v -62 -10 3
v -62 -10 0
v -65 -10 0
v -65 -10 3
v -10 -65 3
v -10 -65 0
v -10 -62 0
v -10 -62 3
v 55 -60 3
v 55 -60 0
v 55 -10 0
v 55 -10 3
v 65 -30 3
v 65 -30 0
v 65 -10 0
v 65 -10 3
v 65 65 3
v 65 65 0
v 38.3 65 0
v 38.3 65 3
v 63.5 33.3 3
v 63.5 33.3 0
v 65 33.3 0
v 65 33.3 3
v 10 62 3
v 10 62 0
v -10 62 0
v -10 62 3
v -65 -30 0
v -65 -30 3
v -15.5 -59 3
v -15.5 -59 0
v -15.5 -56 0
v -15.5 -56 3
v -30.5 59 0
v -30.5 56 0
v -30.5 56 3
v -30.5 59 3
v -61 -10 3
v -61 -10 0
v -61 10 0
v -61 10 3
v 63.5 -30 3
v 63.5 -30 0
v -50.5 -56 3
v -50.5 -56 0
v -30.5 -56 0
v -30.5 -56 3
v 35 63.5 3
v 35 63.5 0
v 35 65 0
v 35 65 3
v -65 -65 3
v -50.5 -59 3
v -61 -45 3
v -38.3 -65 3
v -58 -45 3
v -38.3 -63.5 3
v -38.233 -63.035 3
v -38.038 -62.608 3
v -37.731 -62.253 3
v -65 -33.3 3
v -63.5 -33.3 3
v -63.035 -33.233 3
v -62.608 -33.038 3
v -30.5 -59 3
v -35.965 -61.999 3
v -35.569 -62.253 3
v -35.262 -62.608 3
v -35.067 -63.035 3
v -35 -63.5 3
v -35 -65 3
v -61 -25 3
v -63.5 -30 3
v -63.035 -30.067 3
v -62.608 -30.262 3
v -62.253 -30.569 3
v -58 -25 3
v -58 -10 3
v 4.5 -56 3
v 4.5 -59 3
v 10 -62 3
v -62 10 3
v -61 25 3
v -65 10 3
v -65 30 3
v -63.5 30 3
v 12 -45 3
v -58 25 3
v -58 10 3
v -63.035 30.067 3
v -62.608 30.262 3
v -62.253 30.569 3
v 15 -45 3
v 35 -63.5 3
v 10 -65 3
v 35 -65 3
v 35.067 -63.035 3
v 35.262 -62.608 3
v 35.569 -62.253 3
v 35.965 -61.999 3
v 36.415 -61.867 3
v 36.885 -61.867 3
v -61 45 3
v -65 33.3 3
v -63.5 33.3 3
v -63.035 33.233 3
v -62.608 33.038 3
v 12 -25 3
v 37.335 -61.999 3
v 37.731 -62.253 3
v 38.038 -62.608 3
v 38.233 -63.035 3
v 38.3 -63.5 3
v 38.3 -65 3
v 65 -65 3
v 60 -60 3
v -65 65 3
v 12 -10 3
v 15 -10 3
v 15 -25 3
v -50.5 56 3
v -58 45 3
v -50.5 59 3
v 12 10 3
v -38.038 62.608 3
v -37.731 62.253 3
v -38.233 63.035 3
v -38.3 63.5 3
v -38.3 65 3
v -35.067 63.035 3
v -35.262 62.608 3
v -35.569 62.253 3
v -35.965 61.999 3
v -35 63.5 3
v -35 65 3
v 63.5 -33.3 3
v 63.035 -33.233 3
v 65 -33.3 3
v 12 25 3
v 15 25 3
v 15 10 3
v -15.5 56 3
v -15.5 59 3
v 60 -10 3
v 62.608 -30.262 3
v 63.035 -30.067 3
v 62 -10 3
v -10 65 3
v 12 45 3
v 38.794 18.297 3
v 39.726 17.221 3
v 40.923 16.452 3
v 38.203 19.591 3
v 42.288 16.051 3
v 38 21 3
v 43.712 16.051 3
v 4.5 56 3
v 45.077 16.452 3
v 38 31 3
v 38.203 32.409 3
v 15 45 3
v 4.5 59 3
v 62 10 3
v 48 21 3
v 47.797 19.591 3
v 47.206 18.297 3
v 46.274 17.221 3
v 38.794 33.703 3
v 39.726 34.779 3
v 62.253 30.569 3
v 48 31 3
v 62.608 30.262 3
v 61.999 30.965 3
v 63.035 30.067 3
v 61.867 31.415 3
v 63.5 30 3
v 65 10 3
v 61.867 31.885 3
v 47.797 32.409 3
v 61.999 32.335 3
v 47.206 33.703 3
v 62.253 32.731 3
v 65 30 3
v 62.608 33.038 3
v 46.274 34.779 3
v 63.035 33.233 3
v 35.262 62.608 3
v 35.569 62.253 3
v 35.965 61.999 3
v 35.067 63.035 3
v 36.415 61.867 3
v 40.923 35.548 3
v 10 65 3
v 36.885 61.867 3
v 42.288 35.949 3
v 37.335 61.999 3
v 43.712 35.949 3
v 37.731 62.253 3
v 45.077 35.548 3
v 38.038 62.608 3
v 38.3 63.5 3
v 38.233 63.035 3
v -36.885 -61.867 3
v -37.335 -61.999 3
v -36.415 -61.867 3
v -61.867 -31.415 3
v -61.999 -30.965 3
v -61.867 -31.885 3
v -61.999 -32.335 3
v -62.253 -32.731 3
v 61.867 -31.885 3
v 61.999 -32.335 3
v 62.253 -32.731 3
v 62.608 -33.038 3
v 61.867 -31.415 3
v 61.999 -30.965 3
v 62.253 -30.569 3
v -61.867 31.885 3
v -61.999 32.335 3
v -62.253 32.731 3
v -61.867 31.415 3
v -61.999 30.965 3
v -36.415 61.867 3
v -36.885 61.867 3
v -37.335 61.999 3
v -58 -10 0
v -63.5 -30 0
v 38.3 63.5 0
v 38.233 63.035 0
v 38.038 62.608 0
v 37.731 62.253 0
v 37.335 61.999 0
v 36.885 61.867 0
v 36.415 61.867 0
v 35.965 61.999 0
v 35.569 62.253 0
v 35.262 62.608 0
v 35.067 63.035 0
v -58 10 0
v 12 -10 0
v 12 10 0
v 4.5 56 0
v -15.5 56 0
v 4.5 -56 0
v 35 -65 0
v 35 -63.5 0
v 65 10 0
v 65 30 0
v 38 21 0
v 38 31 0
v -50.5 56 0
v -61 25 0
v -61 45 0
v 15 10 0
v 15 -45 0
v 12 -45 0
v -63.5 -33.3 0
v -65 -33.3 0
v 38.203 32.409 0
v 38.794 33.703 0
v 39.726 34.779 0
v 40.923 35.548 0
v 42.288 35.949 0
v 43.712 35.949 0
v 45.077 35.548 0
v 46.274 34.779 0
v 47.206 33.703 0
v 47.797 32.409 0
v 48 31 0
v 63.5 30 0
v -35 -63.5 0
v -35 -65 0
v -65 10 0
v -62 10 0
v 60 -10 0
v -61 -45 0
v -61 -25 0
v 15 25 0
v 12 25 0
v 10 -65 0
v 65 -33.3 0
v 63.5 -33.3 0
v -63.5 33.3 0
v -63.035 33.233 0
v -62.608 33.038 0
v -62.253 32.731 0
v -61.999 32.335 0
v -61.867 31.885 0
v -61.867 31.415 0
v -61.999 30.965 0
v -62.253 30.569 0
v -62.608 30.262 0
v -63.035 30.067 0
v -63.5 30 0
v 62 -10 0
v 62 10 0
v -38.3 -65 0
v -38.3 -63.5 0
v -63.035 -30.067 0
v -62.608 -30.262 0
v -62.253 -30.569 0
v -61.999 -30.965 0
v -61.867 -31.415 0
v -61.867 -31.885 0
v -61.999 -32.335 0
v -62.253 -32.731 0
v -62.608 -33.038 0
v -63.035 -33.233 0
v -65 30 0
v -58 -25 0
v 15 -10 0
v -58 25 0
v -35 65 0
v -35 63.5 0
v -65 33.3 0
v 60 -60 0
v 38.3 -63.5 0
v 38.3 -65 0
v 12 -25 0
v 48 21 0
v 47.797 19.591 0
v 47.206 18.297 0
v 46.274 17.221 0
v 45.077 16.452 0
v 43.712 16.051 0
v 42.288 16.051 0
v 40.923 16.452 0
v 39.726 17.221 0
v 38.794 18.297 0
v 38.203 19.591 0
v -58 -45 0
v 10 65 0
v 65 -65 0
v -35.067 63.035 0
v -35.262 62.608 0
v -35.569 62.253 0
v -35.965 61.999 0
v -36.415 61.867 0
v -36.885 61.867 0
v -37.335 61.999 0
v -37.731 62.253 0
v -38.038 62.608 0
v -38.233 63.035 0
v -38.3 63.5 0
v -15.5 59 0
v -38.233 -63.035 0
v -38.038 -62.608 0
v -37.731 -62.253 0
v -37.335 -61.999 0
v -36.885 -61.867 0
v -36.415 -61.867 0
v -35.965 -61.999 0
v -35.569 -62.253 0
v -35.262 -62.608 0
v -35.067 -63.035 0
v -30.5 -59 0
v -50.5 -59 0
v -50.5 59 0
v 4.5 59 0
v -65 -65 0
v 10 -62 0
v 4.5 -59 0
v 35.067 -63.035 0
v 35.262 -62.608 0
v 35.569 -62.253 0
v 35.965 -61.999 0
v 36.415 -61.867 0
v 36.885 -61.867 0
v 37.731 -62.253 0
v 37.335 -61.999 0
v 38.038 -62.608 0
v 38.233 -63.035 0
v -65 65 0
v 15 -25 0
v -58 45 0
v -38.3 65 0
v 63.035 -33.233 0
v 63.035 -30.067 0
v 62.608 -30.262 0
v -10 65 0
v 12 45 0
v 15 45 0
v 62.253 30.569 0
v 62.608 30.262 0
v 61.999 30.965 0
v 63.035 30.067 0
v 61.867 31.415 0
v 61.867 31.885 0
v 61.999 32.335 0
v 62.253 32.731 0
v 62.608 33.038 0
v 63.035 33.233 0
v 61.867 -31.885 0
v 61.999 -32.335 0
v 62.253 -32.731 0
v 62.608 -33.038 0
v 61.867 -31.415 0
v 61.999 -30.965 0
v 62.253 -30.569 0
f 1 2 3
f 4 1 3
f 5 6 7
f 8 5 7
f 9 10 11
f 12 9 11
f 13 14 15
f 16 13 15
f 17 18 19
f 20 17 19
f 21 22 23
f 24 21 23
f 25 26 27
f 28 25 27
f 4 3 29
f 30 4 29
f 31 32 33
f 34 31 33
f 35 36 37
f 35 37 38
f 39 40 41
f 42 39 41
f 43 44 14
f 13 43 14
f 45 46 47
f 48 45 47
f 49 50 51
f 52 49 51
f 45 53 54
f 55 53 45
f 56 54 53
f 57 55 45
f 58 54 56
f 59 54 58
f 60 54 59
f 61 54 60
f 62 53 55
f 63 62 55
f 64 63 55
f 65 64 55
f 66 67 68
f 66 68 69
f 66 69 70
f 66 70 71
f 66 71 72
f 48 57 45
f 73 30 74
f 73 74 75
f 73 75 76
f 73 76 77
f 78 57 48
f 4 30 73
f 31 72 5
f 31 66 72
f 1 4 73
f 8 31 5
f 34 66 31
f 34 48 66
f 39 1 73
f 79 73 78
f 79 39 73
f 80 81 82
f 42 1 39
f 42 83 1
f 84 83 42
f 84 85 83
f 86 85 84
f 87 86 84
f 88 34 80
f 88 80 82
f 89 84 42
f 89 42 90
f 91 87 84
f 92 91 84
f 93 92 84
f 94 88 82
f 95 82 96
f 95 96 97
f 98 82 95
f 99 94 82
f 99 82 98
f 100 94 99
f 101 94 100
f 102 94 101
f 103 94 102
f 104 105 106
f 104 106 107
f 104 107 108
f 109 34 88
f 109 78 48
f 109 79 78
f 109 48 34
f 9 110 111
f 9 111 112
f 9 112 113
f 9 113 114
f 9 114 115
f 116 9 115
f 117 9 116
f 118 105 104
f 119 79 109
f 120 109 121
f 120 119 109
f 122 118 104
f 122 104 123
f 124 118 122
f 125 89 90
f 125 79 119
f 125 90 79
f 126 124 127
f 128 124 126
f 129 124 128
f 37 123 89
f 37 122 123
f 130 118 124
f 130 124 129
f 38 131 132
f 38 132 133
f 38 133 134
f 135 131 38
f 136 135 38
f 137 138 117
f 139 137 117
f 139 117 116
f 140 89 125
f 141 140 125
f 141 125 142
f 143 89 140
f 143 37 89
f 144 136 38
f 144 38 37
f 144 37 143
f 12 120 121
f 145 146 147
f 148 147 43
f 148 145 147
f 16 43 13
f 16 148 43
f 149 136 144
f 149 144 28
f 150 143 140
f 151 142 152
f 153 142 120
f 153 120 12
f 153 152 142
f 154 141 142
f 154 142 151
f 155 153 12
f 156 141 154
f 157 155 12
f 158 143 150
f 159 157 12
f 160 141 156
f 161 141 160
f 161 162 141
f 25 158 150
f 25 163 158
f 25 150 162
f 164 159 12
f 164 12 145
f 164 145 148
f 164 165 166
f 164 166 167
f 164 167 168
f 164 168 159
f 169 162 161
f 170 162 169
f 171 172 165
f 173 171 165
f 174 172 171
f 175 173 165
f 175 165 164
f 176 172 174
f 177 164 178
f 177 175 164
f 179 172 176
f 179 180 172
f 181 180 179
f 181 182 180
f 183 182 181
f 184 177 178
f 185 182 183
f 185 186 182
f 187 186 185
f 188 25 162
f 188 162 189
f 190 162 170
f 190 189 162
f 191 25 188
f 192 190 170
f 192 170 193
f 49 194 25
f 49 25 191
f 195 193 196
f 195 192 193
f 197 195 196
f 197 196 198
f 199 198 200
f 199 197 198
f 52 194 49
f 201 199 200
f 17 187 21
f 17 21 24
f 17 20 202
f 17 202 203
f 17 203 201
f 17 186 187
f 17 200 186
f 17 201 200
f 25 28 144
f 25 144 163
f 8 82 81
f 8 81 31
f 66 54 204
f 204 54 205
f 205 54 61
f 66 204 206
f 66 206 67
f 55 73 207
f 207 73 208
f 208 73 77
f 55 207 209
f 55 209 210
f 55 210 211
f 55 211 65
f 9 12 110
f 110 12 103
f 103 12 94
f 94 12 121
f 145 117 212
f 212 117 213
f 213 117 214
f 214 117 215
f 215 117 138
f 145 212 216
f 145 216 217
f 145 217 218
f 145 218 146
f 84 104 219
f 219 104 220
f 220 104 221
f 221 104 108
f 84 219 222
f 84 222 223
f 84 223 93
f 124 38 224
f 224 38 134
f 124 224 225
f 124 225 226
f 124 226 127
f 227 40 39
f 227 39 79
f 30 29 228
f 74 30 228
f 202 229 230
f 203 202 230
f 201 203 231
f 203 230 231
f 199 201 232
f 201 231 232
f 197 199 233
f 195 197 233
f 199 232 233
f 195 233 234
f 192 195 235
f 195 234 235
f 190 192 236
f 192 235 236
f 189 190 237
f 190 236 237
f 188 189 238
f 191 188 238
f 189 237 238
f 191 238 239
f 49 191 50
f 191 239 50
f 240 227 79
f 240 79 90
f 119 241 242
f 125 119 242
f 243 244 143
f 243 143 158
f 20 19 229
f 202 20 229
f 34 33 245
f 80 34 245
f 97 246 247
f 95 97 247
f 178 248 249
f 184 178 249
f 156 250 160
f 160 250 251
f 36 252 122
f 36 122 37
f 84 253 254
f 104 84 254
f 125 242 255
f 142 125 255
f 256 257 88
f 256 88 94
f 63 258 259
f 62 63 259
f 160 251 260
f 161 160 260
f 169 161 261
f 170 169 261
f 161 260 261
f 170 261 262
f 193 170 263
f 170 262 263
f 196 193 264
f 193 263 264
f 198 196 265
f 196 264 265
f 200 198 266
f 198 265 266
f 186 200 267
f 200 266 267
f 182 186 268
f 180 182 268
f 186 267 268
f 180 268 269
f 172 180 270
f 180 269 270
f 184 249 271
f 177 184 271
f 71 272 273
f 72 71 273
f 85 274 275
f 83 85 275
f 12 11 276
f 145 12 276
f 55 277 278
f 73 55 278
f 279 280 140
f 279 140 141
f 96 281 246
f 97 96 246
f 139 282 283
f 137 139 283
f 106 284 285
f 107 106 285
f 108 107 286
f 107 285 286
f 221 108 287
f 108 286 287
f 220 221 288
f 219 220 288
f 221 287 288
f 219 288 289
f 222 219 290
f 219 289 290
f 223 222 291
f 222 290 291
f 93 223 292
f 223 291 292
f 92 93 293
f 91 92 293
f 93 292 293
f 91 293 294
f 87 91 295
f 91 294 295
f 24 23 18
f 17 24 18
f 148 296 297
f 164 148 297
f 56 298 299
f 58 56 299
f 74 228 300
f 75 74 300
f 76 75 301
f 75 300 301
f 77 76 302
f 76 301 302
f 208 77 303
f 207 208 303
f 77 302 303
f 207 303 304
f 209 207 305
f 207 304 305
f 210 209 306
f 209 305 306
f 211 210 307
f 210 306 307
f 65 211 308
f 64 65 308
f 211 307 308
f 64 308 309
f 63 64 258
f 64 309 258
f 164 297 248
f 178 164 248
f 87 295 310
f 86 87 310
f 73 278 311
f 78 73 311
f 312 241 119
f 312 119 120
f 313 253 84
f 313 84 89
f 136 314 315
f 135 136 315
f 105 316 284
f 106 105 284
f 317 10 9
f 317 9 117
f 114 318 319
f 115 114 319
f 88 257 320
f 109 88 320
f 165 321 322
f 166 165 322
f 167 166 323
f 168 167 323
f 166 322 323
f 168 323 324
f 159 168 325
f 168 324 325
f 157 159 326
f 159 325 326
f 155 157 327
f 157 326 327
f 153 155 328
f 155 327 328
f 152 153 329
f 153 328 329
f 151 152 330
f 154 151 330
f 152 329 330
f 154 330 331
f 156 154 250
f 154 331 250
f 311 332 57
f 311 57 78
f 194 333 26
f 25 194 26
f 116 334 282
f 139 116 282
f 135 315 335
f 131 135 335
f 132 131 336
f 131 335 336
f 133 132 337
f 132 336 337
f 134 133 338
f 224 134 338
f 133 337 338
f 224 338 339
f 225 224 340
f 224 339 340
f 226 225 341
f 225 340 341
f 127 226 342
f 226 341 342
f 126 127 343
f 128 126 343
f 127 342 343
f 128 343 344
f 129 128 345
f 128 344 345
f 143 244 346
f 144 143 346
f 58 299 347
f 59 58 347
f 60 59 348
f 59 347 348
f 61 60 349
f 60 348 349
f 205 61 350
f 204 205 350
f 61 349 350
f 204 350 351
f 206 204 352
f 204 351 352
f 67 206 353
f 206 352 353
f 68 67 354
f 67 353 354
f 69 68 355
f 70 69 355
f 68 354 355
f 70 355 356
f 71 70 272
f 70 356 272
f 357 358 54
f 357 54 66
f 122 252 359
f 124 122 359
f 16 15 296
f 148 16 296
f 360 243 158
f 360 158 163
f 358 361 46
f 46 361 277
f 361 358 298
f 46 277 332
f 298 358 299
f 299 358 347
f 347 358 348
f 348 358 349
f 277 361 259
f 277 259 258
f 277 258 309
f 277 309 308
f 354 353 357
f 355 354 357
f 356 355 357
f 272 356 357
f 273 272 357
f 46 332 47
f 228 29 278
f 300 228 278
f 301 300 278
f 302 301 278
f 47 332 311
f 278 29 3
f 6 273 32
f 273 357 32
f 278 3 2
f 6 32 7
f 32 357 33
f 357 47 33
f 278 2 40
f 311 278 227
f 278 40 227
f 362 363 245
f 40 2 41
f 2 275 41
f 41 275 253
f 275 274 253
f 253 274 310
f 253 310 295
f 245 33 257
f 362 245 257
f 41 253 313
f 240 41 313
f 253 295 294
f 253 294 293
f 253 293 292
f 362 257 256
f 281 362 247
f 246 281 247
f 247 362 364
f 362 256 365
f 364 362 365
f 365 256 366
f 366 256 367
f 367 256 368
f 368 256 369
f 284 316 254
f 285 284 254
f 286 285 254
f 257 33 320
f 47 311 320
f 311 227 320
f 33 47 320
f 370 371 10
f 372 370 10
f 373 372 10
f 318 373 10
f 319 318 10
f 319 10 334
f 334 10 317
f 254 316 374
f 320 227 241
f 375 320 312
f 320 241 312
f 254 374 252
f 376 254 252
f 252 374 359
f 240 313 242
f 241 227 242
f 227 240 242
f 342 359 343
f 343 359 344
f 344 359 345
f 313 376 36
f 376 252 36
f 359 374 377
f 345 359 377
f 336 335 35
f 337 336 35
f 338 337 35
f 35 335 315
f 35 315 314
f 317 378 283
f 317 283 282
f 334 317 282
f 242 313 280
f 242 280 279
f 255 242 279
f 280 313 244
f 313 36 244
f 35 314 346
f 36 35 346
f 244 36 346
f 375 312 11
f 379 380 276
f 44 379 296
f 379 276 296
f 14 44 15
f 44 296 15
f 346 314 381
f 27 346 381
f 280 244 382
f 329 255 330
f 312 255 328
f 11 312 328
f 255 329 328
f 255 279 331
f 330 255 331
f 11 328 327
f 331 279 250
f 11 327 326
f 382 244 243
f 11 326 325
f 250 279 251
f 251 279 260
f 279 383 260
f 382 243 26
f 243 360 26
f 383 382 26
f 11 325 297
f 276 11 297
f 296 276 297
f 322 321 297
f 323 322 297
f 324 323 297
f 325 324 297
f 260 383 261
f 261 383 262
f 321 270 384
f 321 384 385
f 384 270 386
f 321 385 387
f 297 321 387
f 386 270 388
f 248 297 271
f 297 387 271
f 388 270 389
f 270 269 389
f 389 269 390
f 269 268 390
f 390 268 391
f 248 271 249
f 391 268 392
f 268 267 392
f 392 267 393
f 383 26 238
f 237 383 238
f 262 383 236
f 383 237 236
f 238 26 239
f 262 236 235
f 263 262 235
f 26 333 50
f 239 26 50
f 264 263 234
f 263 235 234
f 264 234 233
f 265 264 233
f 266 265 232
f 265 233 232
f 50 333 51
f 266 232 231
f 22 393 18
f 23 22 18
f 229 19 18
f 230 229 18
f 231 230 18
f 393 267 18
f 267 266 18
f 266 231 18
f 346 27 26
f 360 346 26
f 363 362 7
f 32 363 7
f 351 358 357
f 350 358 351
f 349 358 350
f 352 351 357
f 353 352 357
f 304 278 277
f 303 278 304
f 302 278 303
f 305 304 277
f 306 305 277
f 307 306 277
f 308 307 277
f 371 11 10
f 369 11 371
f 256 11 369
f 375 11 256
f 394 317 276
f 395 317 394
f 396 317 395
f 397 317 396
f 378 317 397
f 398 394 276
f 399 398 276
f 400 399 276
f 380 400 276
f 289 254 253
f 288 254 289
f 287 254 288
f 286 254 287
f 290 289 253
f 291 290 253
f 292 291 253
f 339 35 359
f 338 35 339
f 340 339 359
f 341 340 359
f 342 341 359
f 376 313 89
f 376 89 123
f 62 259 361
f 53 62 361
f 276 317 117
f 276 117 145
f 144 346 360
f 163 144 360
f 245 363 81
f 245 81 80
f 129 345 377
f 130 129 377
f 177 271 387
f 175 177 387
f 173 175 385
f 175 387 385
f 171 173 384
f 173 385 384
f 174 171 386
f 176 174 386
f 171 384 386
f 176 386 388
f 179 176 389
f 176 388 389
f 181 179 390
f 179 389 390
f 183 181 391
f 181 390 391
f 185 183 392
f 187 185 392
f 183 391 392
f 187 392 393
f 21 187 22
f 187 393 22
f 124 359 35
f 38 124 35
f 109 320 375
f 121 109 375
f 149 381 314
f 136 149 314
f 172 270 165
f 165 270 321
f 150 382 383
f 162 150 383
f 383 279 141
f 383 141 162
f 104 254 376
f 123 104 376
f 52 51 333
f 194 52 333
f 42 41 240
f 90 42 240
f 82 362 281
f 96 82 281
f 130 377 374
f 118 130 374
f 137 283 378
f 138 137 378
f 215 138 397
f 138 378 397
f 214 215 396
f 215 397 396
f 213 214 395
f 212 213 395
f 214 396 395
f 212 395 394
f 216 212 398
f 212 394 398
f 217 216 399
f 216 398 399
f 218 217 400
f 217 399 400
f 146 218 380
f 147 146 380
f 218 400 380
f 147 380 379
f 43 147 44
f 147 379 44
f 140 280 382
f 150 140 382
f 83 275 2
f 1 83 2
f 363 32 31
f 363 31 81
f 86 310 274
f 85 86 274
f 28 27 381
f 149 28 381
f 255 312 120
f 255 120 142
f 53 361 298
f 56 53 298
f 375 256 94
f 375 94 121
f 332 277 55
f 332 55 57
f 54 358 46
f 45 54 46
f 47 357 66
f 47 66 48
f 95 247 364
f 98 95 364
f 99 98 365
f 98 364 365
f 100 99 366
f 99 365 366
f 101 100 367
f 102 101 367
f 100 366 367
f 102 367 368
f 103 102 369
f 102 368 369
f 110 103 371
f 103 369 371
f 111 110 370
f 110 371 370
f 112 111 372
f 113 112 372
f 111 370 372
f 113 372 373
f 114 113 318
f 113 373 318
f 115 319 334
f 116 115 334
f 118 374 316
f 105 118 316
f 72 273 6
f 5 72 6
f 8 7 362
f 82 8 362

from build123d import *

# Parameters (mm, degrees)
SKETCH1_W           = 20
SKETCH1_H           = 3
SKETCH1_W_2         = 3
SKETCH1_H_2         = 20
SKETCH1_W_3         = 5
SKETCH1_H_3         = 50
BOSS_EXTRUDE1_DEPTH = 3


with BuildPart() as part:
    # Sketch1 → Boss-Extrude1 (new body)
    with BuildSketch(Plane.XY):
        with BuildLine():
            Line((10, -62), (10, -65))
            Line((10, -65), (35, -65))
            Line((35, -65), (35, -63.5))
            ThreePointArc((35, -63.5), (36.65, -61.85), (38.3, -63.5))
            Line((38.3, -63.5), (38.3, -65))
            Line((38.3, -65), (65, -65))
            Line((65, -65), (65, -33.3))
            Line((65, -33.3), (63.5, -33.3))
            ThreePointArc((63.5, -33.3), (61.85, -31.65), (63.5, -30))
            Line((63.5, -30), (65, -30))
            Line((65, -30), (65, -10))
            Line((65, -10), (62, -10))
            Line((62, -10), (62, 10))
            Line((62, 10), (65, 10))
            Line((65, 10), (65, 30))
            Line((65, 30), (63.5, 30))
            ThreePointArc((63.5, 30), (61.85, 31.65), (63.5, 33.3))
            Line((63.5, 33.3), (65, 33.3))
            Line((65, 33.3), (65, 65))
            Line((65, 65), (38.3, 65))
            Line((38.3, 65), (38.3, 63.5))
            ThreePointArc((38.3, 63.5), (36.65, 61.85), (35, 63.5))
            Line((35, 63.5), (35, 65))
            Line((35, 65), (10, 65))
            Line((10, 65), (10, 62))
            Line((10, 62), (-10, 62))
            Line((-10, 62), (-10, 65))
            Line((-10, 65), (-35, 65))
            Line((-35, 65), (-35, 63.5))
            ThreePointArc((-35, 63.5), (-36.65, 61.85), (-38.3, 63.5))
            Line((-38.3, 63.5), (-38.3, 65))
            Line((-38.3, 65), (-65, 65))
            Line((-65, 65), (-65, 33.3))
            Line((-65, 33.3), (-63.5, 33.3))
            ThreePointArc((-63.5, 33.3), (-61.85, 31.65), (-63.5, 30))
            Line((-63.5, 30), (-65, 30))
            Line((-65, 30), (-65, 10))
            Line((-65, 10), (-62, 10))
            Line((-62, 10), (-62, -10))
            Line((-62, -10), (-65, -10))
            Line((-65, -10), (-65, -30))
            Line((-65, -30), (-63.5, -30))
            ThreePointArc((-63.5, -30), (-61.85, -31.65), (-63.5, -33.3))
            Line((-63.5, -33.3), (-65, -33.3))
            Line((-65, -33.3), (-65, -65))
            Line((-65, -65), (-38.3, -65))
            Line((-38.3, -65), (-38.3, -63.5))
            ThreePointArc((-38.3, -63.5), (-36.65, -61.85), (-35, -63.5))
            Line((-35, -63.5), (-35, -65))
            Line((-35, -65), (-10, -65))
            Line((-10, -65), (-10, -62))
            Line((-10, -62), (10, -62))
        make_face()
        with Locations((-40.5, -57.5)):
            Rectangle(SKETCH1_W, SKETCH1_H, mode=Mode.SUBTRACT)
        with Locations((-59.5, -35)):
            Rectangle(SKETCH1_W_2, SKETCH1_H_2, mode=Mode.SUBTRACT)
        with Locations((-5.5, -57.5)):
            Rectangle(SKETCH1_W, SKETCH1_H, mode=Mode.SUBTRACT)
        with Locations((13.5, -35)):
            Rectangle(SKETCH1_W_2, SKETCH1_H_2, mode=Mode.SUBTRACT)
        with Locations((57.5, -35)):
            Rectangle(SKETCH1_W_3, SKETCH1_H_3, mode=Mode.SUBTRACT)
        with Locations((-59.5, 0)):
            Rectangle(SKETCH1_W_2, SKETCH1_H_2, mode=Mode.SUBTRACT)
        with Locations((-59.5, 35)):
            Rectangle(SKETCH1_W_2, SKETCH1_H_2, mode=Mode.SUBTRACT)
        with Locations((-40.5, 57.5)):
            Rectangle(SKETCH1_W, SKETCH1_H, mode=Mode.SUBTRACT)
        with Locations((-5.5, 57.5)):
            Rectangle(SKETCH1_W, SKETCH1_H, mode=Mode.SUBTRACT)
        with Locations((13.5, 0)):
            Rectangle(SKETCH1_W_2, SKETCH1_H_2, mode=Mode.SUBTRACT)
        with BuildLine():
            ThreePointArc((38, 31), (43, 36), (48, 31))
            Line((48, 31), (48, 21))
            ThreePointArc((48, 21), (43, 16), (38, 21))
            Line((38, 21), (38, 31))
        make_face(mode=Mode.SUBTRACT)
        with Locations((13.5, 35)):
            Rectangle(SKETCH1_W_2, SKETCH1_H_2, mode=Mode.SUBTRACT)
    extrude(amount=BOSS_EXTRUDE1_DEPTH)


solid = part.part
